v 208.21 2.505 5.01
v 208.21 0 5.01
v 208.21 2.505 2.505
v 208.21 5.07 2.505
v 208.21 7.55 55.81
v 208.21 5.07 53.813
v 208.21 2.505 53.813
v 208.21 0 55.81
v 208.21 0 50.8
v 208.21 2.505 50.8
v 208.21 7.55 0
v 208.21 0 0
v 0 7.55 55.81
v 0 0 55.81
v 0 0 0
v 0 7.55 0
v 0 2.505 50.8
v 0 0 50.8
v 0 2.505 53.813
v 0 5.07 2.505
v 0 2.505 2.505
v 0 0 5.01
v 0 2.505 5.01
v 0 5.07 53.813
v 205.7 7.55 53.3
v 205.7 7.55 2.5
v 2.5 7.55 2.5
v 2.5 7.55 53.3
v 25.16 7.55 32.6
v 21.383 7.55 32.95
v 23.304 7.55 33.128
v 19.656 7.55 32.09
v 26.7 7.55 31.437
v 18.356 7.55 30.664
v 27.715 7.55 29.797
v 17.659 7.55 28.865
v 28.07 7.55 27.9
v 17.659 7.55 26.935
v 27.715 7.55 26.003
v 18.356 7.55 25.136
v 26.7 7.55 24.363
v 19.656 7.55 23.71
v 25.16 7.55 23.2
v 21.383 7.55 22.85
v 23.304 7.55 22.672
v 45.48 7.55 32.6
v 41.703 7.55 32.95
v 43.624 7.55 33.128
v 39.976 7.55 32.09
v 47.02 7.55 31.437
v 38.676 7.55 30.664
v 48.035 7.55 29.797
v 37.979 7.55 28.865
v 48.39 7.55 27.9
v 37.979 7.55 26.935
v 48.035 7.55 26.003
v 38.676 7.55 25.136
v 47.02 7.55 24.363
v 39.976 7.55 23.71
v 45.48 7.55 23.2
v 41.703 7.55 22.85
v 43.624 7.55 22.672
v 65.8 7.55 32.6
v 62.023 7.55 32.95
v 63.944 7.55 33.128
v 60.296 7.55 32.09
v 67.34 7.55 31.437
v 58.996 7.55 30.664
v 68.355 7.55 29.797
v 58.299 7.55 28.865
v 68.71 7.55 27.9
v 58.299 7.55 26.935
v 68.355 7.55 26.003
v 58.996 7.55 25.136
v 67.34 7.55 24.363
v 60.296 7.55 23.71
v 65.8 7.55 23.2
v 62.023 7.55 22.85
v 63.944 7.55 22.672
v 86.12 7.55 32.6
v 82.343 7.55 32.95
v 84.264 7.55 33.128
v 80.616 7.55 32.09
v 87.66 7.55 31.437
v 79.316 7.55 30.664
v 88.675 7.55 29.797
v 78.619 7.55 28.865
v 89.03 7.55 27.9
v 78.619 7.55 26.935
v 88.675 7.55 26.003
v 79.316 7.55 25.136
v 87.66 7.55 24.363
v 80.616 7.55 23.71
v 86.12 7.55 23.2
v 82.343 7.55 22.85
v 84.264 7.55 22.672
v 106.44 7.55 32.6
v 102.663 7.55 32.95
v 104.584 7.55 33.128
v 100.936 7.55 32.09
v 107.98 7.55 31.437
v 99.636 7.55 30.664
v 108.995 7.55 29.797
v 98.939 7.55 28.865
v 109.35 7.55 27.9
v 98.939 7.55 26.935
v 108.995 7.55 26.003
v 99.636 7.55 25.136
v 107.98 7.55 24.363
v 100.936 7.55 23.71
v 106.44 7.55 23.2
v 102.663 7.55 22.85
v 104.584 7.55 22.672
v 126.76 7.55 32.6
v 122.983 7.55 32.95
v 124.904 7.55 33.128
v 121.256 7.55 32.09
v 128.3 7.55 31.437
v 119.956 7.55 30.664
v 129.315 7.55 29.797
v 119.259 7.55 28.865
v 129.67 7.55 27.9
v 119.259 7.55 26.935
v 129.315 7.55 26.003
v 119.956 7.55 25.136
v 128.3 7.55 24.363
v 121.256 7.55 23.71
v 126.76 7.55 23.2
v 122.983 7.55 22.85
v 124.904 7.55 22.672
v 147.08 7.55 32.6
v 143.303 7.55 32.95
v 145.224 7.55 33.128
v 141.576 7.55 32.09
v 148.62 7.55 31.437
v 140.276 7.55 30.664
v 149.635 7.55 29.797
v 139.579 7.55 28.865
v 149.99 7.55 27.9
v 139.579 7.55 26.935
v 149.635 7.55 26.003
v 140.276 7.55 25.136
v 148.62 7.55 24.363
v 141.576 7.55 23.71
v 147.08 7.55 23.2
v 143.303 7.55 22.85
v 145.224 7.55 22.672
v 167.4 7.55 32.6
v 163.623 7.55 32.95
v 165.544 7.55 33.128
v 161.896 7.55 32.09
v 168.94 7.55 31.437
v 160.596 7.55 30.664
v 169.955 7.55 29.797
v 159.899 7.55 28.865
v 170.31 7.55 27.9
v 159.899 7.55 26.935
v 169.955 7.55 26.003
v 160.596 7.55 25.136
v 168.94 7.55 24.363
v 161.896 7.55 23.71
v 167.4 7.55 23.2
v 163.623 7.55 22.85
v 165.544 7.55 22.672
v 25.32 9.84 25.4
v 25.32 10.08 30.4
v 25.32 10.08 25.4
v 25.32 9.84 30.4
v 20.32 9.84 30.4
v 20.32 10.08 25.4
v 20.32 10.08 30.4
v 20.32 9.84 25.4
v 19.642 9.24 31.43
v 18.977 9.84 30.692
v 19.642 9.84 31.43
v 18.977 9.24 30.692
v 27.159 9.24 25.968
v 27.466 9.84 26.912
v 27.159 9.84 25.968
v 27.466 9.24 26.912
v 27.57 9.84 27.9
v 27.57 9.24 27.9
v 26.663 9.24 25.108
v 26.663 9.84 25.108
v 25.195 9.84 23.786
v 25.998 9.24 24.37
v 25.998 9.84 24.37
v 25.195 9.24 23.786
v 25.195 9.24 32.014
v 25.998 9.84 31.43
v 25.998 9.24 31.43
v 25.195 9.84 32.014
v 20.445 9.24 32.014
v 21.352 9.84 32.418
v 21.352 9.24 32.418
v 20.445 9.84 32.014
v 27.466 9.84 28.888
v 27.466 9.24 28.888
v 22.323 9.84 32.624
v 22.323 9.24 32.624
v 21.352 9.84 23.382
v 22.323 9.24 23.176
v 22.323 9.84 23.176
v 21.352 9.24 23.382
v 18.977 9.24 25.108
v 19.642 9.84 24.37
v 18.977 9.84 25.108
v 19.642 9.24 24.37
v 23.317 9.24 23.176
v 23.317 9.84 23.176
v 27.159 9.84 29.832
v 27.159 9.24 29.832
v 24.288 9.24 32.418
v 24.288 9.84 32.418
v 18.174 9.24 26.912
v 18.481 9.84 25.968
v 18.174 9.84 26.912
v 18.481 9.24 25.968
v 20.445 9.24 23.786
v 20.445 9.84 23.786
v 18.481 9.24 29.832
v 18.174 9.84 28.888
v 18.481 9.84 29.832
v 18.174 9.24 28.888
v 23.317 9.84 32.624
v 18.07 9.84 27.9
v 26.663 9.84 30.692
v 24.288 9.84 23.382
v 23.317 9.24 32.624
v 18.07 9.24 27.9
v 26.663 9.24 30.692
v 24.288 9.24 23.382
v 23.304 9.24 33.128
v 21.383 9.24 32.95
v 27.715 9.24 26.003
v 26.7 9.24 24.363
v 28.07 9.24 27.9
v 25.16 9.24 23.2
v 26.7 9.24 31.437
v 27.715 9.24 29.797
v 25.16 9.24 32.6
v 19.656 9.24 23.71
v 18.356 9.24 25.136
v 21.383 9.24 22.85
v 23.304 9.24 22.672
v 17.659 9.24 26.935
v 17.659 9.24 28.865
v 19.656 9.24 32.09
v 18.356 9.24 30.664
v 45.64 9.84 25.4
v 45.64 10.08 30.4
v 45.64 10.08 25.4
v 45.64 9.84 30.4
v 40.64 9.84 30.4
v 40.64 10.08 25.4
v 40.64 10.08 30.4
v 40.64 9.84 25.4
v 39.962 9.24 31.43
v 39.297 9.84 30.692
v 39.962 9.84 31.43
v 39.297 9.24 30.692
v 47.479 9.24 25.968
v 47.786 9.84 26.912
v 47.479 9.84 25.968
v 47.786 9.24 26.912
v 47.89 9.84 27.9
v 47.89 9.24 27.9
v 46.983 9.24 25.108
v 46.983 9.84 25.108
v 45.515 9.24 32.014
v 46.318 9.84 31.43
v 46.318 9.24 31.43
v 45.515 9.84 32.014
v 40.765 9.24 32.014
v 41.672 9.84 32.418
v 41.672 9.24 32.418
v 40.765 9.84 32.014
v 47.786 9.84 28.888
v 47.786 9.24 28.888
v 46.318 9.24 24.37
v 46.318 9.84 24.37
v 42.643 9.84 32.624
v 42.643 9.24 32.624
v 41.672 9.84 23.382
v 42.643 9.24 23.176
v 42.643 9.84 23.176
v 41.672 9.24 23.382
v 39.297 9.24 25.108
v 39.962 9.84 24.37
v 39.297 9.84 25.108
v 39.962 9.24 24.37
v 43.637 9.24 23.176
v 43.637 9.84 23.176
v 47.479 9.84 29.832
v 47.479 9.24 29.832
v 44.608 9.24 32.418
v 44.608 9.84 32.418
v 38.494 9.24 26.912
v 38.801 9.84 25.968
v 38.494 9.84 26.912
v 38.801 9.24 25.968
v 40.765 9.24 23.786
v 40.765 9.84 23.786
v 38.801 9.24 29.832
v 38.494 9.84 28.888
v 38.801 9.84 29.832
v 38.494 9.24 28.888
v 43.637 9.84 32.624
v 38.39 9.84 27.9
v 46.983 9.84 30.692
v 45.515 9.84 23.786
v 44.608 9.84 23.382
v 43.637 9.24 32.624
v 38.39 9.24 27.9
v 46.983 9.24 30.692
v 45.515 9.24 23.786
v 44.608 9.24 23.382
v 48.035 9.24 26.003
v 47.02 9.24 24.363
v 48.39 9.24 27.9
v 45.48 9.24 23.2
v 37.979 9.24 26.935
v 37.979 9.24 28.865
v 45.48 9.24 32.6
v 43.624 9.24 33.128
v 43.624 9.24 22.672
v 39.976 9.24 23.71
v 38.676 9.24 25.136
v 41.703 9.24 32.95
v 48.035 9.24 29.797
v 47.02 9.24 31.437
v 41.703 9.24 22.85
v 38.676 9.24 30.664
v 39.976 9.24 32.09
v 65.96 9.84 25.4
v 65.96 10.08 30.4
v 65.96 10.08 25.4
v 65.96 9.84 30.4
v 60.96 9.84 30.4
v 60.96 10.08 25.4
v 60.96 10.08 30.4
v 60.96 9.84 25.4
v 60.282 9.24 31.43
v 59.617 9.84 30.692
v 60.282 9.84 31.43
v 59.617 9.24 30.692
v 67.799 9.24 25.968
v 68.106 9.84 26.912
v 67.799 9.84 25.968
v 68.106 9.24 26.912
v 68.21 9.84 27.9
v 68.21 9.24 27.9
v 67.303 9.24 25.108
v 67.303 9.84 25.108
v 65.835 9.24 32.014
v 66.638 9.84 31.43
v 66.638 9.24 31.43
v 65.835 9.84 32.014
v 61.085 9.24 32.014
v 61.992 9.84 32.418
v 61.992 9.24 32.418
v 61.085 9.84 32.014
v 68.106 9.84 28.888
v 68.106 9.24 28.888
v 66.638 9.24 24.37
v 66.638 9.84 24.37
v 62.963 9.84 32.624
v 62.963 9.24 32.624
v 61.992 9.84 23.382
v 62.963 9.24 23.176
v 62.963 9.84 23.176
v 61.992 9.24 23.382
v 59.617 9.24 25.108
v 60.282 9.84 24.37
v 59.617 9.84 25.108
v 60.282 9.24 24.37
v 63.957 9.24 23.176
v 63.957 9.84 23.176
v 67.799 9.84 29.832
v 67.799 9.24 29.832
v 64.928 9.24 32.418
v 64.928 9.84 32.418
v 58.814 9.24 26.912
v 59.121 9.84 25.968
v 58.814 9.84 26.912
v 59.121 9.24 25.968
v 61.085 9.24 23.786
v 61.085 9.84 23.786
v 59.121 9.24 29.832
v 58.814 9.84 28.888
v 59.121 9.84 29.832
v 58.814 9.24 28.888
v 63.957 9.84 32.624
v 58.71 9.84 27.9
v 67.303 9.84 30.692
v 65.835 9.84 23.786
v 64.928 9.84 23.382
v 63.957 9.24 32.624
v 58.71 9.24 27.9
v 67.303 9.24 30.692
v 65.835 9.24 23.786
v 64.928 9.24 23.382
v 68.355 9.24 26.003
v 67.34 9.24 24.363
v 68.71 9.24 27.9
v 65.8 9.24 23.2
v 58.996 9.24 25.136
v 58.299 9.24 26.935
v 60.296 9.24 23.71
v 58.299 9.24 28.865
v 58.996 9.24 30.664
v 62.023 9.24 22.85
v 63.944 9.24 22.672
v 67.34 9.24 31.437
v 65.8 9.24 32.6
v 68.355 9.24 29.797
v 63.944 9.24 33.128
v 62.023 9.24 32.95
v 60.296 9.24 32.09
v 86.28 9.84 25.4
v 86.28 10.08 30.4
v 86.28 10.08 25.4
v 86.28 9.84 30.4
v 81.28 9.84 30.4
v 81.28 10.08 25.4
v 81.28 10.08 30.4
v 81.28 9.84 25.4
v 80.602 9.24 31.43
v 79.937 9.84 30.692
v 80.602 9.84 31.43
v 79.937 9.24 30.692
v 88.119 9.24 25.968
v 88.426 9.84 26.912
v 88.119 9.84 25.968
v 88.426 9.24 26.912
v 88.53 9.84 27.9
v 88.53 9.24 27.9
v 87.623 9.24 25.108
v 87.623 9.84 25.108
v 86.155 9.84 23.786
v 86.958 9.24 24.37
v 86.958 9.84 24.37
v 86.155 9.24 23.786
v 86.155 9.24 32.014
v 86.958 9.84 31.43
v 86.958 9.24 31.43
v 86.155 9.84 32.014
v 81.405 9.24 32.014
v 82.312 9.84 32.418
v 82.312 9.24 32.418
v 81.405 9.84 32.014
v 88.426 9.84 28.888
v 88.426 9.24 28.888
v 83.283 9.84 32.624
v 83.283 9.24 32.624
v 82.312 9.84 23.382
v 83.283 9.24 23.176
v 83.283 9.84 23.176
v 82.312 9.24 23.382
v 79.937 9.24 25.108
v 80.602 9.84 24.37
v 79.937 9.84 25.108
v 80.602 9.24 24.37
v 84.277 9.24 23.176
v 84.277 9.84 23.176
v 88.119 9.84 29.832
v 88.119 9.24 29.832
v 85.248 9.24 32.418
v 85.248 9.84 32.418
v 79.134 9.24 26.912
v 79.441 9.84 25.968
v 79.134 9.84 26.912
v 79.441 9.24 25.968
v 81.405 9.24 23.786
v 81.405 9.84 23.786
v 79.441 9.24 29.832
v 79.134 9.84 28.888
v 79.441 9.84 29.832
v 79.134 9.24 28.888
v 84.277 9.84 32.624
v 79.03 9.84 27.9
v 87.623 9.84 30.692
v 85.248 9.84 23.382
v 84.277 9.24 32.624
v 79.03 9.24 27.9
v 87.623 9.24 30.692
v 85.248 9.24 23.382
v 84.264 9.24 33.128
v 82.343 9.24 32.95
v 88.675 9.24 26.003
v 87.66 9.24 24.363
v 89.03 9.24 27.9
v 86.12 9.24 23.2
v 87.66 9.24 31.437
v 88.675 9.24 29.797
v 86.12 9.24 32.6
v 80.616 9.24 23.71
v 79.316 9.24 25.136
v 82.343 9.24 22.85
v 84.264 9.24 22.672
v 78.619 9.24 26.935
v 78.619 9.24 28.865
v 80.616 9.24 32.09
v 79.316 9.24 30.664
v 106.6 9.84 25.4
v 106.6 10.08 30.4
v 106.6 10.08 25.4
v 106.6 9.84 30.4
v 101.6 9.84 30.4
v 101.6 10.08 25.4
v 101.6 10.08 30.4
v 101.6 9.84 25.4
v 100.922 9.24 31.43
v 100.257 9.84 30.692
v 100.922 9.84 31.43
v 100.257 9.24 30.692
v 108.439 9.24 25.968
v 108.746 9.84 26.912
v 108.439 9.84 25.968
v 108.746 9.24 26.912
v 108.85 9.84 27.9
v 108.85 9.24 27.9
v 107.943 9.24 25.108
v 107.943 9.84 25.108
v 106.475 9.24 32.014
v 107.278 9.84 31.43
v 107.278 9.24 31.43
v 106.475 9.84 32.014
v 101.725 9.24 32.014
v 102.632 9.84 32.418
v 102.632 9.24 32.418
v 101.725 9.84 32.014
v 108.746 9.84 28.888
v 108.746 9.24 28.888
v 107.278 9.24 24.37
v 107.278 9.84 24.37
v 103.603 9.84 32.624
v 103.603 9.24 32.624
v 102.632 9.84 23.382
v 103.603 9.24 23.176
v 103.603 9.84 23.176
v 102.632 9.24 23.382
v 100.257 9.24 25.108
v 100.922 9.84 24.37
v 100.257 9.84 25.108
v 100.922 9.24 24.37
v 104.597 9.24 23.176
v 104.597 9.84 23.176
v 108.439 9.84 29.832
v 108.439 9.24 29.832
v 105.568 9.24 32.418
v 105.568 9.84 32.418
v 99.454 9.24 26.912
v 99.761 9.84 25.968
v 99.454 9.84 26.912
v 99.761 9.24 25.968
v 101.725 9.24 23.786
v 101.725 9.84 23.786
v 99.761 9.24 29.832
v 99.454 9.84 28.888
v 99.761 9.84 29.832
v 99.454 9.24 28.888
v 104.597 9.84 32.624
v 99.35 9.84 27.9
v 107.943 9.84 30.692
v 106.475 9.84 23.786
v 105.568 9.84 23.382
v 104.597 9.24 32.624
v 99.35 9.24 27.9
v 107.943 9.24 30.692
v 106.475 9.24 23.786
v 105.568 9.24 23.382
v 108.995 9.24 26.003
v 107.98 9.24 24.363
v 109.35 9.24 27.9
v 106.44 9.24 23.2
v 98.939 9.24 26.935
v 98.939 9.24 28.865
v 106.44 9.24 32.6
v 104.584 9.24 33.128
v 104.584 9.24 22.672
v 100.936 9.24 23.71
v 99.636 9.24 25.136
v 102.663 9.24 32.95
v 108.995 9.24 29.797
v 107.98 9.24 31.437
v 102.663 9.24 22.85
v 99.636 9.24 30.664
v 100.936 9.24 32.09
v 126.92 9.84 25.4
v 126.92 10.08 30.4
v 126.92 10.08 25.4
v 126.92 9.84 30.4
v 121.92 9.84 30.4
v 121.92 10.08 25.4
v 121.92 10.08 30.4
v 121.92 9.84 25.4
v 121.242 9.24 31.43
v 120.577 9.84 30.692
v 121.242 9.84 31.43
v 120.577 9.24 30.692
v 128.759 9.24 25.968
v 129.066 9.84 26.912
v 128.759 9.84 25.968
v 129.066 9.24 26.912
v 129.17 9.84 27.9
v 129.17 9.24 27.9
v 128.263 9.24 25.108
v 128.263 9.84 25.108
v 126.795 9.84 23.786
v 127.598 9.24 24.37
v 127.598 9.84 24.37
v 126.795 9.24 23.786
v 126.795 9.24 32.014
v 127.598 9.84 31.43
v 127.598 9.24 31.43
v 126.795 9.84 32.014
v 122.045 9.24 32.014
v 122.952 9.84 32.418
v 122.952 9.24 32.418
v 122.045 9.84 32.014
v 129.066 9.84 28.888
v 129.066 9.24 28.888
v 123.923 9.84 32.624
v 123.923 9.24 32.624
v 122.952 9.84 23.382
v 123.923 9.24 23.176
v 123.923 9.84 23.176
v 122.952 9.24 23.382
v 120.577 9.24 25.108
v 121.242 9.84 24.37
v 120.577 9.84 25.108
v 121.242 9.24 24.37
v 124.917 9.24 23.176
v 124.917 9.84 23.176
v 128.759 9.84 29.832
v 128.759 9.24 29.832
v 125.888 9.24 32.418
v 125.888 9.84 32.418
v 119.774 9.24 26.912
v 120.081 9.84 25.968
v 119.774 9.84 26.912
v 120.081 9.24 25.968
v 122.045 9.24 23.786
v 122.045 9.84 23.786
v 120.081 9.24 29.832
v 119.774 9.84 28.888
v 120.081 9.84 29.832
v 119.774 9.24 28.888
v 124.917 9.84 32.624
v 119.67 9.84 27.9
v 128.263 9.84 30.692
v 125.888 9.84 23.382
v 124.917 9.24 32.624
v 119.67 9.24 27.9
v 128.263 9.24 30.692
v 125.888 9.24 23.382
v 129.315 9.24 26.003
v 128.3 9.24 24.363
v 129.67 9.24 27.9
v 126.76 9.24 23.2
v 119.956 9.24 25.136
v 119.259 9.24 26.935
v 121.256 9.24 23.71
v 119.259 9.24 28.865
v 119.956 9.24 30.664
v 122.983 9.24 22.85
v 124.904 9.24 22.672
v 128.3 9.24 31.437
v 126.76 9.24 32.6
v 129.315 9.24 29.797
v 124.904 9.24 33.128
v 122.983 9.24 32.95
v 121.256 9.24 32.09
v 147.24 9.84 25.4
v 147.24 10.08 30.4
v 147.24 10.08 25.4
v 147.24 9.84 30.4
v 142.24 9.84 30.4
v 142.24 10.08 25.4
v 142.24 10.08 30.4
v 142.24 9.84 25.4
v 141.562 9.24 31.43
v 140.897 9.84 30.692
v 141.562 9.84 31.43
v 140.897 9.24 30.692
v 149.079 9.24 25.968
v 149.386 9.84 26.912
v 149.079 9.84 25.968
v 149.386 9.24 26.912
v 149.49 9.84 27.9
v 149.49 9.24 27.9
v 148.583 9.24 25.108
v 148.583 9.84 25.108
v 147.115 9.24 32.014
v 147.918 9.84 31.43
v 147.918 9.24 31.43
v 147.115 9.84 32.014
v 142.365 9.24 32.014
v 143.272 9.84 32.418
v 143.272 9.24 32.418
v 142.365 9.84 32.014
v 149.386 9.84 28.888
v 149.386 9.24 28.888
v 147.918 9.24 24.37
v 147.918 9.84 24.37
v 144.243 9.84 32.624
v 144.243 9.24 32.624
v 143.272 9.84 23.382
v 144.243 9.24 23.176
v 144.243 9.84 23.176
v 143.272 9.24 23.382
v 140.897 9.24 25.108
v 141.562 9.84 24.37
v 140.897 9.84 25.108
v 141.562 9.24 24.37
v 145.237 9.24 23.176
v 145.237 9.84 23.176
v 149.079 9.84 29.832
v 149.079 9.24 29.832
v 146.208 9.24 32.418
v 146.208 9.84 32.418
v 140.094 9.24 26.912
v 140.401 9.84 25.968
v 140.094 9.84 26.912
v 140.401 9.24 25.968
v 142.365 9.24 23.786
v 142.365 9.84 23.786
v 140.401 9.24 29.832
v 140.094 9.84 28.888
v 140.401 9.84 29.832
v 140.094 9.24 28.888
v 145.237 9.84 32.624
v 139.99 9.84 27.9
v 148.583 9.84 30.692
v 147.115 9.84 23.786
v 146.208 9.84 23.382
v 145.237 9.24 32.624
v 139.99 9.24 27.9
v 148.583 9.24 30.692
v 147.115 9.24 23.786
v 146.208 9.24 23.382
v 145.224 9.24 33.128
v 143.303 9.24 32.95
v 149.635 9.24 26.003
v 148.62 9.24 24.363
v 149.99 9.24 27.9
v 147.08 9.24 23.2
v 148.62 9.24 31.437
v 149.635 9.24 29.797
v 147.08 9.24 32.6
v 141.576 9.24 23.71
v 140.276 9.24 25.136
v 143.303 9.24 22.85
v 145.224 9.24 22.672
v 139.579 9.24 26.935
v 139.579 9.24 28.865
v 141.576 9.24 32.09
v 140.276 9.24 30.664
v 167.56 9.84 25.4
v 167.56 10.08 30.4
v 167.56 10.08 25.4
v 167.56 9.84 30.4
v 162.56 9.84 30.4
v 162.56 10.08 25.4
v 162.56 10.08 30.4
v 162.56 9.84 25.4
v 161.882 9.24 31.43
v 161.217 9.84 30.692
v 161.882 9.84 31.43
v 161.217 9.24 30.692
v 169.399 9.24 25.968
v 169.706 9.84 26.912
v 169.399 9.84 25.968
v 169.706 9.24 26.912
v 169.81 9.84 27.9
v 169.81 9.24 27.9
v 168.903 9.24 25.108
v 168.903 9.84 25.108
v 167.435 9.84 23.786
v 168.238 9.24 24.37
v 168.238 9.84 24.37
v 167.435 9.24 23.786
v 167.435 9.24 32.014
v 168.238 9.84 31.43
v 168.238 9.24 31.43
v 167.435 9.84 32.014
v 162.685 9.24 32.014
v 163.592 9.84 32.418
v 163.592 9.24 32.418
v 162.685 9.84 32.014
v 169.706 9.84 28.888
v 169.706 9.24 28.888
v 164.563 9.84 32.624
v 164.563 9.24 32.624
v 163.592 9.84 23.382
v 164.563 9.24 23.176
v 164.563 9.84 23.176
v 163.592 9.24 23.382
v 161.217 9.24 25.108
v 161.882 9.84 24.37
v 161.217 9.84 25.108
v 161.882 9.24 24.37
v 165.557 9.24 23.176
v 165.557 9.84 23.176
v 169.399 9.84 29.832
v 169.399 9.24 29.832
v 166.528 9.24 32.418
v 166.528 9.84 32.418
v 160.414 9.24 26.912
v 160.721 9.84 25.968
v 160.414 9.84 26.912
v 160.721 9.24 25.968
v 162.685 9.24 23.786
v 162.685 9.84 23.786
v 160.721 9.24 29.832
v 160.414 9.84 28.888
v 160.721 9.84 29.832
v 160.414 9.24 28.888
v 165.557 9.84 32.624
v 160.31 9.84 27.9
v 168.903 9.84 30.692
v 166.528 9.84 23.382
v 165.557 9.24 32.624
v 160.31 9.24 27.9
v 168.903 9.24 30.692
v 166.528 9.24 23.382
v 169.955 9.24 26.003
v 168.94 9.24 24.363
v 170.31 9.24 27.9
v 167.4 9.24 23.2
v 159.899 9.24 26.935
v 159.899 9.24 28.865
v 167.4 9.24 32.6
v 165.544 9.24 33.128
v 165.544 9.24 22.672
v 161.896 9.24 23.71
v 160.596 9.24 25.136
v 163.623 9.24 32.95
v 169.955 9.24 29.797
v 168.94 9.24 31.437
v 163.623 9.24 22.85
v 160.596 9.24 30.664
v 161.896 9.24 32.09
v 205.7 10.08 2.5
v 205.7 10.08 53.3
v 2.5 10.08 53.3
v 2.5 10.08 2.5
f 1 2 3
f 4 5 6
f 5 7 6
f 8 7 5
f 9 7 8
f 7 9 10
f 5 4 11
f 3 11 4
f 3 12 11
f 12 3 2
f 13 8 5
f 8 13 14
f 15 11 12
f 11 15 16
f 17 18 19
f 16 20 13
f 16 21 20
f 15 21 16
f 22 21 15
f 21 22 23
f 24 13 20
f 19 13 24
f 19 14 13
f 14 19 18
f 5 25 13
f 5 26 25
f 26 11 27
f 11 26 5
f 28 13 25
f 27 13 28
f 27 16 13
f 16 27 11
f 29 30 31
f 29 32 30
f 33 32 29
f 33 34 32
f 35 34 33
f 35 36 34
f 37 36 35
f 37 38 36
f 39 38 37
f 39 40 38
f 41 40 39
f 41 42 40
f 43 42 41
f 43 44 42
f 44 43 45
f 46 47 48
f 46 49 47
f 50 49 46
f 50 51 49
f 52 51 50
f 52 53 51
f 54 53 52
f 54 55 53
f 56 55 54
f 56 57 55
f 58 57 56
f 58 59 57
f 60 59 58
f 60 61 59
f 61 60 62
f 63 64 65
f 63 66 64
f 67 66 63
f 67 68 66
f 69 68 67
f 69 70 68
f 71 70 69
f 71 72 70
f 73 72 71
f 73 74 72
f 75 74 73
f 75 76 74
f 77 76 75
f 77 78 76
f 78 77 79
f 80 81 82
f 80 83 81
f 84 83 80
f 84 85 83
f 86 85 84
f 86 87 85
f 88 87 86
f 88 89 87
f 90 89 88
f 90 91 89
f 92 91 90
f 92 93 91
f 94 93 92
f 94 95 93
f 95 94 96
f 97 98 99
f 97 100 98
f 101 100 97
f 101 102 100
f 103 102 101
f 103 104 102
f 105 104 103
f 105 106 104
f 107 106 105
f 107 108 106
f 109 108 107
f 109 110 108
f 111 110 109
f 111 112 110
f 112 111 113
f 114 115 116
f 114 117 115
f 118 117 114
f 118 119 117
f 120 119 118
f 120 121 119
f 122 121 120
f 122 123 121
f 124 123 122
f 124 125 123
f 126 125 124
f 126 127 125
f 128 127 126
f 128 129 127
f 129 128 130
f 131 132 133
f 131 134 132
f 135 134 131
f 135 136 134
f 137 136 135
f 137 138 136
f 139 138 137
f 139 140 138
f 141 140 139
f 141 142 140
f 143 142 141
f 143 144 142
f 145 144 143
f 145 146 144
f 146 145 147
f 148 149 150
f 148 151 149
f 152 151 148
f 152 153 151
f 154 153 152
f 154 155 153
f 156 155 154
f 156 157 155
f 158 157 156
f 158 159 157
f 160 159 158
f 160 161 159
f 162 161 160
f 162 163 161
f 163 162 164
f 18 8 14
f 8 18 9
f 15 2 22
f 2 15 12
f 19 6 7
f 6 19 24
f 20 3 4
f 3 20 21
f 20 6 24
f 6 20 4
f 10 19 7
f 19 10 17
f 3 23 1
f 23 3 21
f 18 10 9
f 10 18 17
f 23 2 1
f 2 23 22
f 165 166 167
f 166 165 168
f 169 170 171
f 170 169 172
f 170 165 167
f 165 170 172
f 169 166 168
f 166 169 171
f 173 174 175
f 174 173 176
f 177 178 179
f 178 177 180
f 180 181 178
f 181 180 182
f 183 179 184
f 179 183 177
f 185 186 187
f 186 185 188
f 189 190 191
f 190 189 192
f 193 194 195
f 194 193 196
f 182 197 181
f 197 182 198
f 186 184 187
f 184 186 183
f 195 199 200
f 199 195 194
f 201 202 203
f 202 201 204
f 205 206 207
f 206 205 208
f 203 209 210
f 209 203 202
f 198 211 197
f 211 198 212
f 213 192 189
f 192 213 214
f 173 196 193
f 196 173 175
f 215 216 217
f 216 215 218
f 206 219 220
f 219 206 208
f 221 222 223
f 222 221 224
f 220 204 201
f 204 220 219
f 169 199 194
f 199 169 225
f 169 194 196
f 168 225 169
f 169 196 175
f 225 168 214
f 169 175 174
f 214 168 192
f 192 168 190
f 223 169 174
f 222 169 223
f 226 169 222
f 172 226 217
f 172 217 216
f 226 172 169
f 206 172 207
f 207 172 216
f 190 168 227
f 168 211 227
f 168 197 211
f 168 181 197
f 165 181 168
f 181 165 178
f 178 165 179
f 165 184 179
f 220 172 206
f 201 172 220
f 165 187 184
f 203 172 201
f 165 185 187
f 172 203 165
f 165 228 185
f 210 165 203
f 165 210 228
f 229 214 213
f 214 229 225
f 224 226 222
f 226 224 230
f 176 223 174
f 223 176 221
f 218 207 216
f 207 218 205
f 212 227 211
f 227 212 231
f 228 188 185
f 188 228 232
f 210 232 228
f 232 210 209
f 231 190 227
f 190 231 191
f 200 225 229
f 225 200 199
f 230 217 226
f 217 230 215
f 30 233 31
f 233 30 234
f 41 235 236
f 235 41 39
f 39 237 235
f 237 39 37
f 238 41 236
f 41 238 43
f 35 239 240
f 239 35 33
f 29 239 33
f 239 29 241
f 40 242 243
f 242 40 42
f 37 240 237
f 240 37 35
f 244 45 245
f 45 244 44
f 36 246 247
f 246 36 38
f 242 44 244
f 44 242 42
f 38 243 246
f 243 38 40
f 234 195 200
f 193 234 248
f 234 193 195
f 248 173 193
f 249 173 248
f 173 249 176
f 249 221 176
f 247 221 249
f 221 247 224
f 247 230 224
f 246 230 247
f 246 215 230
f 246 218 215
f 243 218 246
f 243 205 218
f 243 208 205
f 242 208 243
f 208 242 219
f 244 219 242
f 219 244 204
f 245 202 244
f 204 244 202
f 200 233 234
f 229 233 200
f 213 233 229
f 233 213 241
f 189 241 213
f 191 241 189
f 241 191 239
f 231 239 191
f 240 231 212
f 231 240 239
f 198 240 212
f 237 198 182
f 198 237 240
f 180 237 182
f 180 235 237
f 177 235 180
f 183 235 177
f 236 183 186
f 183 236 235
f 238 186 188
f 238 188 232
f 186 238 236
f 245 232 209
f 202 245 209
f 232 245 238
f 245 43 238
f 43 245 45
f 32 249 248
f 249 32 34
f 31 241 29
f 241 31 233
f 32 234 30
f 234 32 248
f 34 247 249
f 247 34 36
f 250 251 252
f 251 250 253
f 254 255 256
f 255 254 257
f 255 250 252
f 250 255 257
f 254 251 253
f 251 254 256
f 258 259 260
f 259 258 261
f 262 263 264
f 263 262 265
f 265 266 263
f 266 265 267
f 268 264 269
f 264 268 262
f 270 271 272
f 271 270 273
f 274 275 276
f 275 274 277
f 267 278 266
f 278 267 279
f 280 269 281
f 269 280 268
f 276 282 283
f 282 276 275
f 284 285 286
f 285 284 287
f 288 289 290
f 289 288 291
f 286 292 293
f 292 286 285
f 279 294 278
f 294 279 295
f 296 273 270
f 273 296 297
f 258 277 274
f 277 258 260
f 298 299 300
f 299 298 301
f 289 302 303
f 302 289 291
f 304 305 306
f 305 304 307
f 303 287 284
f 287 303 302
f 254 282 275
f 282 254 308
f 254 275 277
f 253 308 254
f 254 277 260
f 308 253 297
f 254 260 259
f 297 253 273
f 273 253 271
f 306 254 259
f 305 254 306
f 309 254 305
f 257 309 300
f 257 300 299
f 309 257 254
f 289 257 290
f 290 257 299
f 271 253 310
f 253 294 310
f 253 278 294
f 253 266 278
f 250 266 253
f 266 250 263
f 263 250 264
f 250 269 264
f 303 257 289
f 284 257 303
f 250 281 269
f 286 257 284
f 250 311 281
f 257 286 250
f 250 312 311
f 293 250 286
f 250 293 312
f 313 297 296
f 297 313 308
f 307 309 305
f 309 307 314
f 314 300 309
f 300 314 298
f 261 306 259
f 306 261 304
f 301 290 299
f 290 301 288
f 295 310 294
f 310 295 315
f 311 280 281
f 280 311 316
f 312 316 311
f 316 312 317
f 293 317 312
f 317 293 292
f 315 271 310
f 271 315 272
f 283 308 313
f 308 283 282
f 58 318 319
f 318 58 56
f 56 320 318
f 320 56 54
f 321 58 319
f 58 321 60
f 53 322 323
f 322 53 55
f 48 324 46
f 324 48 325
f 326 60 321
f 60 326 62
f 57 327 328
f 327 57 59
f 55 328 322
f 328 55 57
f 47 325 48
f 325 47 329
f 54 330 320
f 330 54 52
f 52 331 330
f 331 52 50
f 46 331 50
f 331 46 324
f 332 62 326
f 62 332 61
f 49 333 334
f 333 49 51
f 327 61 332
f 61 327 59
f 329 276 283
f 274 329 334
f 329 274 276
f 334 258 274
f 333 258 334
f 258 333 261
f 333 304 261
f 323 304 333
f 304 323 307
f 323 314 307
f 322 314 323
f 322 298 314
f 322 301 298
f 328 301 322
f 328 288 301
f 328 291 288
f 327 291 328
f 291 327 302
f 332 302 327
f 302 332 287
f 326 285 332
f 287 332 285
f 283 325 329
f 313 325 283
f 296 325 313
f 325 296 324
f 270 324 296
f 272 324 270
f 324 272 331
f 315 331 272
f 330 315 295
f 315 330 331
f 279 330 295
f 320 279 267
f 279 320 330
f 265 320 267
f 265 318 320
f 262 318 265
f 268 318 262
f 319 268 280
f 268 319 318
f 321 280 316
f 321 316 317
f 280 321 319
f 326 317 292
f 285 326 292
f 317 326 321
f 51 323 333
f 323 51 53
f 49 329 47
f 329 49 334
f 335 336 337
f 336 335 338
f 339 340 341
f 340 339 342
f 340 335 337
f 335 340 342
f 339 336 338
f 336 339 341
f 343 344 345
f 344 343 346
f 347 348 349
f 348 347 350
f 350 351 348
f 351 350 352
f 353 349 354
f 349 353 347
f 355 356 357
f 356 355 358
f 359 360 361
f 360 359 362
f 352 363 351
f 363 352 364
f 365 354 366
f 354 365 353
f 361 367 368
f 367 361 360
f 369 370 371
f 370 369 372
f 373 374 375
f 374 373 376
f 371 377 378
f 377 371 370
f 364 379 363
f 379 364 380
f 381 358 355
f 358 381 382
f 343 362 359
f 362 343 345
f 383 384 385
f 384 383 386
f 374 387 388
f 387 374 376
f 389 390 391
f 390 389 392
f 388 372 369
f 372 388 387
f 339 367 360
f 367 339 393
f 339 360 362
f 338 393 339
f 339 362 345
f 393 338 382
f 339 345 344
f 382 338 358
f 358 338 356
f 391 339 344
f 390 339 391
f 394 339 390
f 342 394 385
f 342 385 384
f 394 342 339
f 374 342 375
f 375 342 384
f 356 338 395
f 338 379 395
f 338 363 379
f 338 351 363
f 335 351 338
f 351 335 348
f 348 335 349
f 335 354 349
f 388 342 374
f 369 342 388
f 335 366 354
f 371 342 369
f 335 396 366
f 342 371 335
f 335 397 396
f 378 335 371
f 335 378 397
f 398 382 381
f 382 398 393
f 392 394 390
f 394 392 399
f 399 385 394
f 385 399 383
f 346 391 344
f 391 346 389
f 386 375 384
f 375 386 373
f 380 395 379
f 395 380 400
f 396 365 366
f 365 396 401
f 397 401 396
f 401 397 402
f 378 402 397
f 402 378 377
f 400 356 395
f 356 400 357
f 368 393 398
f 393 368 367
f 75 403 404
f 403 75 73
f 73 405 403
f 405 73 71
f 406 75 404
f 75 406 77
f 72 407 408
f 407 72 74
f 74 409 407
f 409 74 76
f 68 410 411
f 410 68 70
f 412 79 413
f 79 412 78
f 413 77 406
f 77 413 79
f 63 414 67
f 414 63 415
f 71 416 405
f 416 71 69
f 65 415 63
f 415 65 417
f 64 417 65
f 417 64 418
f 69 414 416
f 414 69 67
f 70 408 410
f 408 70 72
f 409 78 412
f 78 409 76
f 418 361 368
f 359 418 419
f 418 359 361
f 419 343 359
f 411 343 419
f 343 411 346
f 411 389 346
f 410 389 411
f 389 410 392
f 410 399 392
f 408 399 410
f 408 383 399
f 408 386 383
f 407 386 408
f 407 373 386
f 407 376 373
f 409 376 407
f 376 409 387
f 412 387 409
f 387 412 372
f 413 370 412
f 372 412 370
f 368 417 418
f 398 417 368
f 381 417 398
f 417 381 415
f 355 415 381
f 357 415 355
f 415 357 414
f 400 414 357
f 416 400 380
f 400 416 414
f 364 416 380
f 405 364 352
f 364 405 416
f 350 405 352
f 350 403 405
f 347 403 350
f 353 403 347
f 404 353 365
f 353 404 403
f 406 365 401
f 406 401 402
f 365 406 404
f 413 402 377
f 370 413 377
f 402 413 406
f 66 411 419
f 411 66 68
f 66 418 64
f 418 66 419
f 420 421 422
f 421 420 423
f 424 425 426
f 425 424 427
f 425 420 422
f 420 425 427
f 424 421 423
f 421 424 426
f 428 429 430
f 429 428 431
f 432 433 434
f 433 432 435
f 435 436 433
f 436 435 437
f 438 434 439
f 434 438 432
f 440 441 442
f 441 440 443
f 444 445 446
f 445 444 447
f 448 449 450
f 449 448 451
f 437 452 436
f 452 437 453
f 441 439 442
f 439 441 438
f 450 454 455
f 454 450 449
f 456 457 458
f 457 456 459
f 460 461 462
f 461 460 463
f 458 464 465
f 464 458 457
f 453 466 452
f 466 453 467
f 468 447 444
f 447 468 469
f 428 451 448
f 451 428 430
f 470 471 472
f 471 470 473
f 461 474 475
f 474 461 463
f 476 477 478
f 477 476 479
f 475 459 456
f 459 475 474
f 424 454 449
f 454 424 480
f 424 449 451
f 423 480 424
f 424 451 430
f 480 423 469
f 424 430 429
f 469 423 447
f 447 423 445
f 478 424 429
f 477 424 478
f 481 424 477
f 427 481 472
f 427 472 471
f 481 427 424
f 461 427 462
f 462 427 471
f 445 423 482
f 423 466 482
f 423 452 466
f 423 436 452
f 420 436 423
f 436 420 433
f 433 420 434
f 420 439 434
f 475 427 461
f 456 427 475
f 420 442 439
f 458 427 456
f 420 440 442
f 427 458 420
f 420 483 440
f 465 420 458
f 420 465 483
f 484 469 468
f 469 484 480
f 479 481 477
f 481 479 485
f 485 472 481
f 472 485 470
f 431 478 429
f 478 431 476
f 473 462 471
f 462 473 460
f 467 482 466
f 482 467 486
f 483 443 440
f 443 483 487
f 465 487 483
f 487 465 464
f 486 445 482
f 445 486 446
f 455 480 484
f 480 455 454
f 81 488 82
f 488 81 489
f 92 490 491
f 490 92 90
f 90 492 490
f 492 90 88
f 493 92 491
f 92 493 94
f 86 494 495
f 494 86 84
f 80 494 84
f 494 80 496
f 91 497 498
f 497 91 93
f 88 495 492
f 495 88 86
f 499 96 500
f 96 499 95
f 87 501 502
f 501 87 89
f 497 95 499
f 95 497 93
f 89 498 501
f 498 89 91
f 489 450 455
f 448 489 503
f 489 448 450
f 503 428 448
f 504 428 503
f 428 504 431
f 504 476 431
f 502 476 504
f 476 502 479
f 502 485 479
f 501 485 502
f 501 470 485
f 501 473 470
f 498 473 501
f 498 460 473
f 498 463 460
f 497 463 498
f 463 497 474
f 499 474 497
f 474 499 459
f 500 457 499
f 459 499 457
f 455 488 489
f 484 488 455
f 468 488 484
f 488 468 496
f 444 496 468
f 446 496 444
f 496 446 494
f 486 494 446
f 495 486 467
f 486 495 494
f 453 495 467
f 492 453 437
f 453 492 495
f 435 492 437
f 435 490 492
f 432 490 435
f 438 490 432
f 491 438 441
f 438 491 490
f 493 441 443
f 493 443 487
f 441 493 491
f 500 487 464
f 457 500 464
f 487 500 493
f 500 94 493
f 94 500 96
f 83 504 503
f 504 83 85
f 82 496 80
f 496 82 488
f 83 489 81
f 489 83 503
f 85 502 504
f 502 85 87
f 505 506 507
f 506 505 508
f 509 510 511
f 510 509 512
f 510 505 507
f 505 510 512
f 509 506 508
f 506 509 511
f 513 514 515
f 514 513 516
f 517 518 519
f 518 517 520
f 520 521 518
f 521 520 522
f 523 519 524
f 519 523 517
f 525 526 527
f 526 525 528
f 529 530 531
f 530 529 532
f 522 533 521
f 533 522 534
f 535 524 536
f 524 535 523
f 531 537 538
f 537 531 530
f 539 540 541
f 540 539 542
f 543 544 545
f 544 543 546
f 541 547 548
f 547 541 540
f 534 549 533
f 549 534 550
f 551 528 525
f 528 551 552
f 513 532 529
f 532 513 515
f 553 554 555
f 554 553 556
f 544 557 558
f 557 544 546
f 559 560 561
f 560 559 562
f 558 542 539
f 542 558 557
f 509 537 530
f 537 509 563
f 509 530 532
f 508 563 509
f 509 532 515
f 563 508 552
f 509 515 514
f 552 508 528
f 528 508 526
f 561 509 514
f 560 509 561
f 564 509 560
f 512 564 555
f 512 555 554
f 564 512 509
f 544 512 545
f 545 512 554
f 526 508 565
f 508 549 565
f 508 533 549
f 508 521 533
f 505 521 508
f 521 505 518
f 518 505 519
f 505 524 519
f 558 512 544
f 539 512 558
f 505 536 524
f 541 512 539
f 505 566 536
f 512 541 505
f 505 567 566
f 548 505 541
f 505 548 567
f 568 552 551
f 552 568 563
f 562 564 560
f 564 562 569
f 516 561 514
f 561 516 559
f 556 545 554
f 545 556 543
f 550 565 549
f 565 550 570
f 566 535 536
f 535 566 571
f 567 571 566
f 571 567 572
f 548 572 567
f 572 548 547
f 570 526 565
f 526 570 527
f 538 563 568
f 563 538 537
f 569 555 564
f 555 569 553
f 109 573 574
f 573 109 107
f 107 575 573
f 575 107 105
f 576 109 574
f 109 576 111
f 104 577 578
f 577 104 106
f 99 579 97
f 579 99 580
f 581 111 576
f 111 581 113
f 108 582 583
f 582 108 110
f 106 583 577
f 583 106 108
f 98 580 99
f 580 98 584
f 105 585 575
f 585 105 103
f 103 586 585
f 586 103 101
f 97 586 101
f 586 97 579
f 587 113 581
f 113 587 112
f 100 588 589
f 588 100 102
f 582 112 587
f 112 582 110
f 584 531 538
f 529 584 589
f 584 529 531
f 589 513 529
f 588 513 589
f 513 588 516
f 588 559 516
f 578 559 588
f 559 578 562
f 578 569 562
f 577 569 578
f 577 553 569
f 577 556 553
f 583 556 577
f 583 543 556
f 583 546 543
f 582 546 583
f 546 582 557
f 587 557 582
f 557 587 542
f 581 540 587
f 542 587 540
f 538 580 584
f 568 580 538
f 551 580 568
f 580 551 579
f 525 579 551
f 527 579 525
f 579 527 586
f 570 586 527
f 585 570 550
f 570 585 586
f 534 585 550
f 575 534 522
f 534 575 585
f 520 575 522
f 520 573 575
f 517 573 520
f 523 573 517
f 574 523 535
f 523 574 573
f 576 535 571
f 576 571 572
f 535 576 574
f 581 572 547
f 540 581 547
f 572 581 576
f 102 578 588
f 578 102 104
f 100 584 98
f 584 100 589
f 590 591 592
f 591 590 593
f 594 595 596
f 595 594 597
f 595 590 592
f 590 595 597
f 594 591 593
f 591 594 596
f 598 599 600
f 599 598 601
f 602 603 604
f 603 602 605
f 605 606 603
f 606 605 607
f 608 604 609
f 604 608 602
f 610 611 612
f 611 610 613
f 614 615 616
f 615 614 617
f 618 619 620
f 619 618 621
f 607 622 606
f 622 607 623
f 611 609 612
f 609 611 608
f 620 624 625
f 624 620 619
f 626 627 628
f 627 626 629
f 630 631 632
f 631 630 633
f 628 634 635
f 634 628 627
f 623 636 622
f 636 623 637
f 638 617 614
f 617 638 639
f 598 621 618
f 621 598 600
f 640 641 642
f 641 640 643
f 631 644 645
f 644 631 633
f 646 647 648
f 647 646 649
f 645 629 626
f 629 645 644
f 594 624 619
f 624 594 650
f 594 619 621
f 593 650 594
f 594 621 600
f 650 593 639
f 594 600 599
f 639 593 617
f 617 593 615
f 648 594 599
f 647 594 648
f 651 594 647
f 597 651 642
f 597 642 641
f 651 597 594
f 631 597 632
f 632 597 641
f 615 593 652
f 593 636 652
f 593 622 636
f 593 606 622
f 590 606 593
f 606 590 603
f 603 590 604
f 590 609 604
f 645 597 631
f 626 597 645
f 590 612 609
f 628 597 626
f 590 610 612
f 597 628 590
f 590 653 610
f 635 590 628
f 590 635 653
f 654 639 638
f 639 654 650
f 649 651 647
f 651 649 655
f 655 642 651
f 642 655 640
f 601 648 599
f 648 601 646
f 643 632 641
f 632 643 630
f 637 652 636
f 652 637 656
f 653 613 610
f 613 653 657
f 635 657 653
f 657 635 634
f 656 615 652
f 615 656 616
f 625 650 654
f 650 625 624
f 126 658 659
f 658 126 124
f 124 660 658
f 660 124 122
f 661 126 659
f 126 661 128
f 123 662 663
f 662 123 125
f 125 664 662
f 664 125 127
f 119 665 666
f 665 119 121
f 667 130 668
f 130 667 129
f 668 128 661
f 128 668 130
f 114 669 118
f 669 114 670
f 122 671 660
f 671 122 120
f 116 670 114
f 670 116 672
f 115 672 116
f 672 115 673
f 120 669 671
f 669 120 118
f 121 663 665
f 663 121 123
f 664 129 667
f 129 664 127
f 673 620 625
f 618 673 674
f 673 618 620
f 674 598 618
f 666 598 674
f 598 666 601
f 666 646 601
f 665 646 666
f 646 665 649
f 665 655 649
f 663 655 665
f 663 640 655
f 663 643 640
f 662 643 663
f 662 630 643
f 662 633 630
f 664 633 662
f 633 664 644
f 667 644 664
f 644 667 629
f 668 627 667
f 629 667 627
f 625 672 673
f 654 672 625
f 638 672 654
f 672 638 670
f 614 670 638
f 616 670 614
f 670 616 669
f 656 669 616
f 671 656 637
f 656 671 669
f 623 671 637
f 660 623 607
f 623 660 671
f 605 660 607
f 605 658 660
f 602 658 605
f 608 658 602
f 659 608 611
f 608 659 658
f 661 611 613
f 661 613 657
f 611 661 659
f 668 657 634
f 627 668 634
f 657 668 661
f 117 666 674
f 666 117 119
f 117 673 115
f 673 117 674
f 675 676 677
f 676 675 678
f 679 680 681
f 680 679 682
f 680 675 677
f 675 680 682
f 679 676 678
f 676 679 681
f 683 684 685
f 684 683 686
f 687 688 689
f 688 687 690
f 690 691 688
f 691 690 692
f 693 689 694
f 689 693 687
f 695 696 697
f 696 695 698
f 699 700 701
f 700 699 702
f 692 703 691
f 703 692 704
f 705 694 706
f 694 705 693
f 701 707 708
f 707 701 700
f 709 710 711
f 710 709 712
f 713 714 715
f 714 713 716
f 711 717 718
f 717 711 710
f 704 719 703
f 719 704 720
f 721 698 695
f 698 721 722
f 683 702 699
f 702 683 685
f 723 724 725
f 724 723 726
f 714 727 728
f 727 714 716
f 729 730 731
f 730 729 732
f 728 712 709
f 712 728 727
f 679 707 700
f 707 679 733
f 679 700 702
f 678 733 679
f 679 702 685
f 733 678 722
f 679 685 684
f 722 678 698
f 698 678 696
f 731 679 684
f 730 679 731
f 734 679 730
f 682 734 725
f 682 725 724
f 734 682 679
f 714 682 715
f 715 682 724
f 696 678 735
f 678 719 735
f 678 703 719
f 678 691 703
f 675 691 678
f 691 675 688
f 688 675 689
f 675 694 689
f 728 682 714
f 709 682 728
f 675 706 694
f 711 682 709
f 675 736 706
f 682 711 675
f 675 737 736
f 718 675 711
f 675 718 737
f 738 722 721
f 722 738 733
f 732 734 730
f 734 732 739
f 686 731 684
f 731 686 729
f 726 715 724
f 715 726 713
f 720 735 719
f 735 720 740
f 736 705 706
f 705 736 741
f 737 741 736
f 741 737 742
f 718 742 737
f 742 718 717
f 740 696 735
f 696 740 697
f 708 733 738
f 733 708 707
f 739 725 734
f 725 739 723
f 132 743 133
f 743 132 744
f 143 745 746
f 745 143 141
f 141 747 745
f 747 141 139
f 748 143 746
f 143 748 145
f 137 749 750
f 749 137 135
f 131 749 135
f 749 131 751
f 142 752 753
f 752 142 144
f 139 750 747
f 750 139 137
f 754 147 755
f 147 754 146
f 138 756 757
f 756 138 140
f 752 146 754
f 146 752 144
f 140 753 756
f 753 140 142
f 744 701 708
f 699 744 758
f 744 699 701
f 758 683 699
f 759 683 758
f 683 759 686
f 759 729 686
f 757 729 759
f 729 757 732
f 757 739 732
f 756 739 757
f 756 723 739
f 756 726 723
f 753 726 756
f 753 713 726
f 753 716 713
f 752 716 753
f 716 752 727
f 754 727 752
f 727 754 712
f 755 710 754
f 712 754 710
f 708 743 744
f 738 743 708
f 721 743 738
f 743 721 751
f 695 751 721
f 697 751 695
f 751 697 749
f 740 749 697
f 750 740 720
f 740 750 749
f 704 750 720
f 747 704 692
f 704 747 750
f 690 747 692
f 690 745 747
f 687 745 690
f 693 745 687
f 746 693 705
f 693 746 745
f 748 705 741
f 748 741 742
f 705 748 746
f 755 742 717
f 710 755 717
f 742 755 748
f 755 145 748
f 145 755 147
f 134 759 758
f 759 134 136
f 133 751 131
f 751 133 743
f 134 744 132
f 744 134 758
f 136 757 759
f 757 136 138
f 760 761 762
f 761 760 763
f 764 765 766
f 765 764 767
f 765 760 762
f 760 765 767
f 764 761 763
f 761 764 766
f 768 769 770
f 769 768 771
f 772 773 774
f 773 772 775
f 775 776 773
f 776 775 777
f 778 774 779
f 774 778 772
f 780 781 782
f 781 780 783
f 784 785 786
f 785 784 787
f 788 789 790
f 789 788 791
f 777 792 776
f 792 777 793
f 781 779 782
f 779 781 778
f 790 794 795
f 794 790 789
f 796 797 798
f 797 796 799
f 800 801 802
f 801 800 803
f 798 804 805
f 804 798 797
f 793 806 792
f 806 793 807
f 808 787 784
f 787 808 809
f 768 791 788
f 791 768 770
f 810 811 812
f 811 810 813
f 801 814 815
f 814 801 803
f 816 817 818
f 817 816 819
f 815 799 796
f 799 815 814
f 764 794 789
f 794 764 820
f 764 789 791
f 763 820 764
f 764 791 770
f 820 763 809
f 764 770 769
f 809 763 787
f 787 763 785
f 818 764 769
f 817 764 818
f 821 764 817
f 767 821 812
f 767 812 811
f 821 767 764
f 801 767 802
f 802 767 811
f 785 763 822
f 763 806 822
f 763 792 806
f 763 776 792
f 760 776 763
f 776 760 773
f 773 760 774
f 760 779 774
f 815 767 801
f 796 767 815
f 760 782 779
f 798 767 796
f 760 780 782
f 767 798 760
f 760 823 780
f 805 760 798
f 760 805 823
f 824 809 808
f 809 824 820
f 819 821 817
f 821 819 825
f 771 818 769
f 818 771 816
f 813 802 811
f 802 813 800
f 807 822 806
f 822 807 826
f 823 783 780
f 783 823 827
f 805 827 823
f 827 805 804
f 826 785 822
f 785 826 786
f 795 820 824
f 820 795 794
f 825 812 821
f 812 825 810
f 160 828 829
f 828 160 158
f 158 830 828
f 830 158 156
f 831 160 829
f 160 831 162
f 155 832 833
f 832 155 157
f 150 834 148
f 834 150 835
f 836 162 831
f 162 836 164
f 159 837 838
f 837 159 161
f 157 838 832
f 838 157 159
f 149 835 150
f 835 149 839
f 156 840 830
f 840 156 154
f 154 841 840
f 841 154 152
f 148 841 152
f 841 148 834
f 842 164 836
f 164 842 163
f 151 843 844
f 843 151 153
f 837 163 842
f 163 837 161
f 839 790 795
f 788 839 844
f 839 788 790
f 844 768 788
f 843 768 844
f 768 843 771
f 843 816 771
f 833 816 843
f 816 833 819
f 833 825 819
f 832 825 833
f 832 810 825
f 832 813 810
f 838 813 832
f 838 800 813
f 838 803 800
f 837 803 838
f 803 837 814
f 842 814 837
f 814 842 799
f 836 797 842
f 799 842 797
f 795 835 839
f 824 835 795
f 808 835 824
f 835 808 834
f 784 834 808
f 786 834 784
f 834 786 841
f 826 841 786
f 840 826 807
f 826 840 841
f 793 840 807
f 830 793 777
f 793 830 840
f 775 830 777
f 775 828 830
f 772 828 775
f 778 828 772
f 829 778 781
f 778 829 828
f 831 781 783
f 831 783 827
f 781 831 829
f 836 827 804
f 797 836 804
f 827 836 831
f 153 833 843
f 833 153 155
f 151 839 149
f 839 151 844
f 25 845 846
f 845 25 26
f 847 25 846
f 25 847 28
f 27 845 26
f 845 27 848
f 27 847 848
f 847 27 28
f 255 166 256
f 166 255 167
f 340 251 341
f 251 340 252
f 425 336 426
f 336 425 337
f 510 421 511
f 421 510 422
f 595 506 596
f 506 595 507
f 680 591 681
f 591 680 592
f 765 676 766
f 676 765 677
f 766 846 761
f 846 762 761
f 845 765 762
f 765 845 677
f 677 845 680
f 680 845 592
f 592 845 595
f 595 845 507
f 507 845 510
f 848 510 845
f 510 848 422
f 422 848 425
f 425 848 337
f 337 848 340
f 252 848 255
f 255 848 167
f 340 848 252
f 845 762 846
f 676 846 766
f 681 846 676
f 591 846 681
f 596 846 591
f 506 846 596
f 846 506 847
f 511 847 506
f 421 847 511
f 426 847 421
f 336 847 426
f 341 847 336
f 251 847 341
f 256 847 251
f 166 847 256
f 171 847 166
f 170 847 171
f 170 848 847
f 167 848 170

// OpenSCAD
// file: ../lib/neo_pixel.scad
///< Alitovo Neo pixel RGB X000UCVKBH 2812b-1-LED-WH
use <../lib/math.scad>;
use <../lib/utils.scad>;

///< Parameters - Begin
led_assembly_h = 2.8;
led_assembly_d = 9.5;

///< Diameter of the PCB 
pcb_d = 9.5;
pcb_h = 1.2;

///< Demensions of the LED IC
led_w = 5;
led_d = led_w;
led_h = led_assembly_h - pcb_h;


///< Modules
module pcb(){
     ///< LED PCB definition
     color( rand_clr() )cylinder( h=pcb_h, d=pcb_d, $fn = 30 );
}

module led(){
     ///< Neo pixel LED (2812b-1)
     union(){
         color( rand_clr() )cube( [ led_w, led_d, led_h ] );
         color( rand_clr() )
              translate([led_w/2,led_d/2, 0] )
              cylinder( h=led_h, d= led_w, $fn = 30 );
         }
}

module neo_pixel(){
     ///< Assembly of the led and pcb_pad
     union(){
          translate([-led_w/2,-led_d/2,pcb_h-0.01])led();
          pcb();
          }

}

///< Build object
///< Remove this when including
//neo_pixel();
// file: nameplate.scad
///< Nameplate
/*
https://en.wikipedia.org/wiki/Nameplate
Excerpt:  'Although office nameplates range in size, the most popular nameplate size is 2 by 8 inches (5.08 cm × 20.32 cm)'

*/
use <../lib/math.scad>;
use <../lib/utils.scad>;

///< Parameters
nameplate_w_inches = 8;
nameplate_h_inches = 2;
nameplate_d_inches = 0.10;

nameplate_w = in2mm( nameplate_w_inches );
nameplate_h = in2mm( nameplate_h_inches );
nameplate_d = in2mm( nameplate_d_inches );

nameplate_debug = false;

if( nameplate_debug ) {
     echo( "Nameplate width: ",  nameplate_w,  "mm" );
     echo( "Nameplate height: ", nameplate_h, "mm" );
     echo( "Nameplate depth: ",  nameplate_d,  "mm" );
}

nameplate = [ nameplate_w, nameplate_d, nameplate_h ];

///< Modules
module Nameplate( size, center = false ) {
     cube( size, center = center );
}
// file: led_frame.scad
///< LED frame for the neo pixel array
use <../lib/math.scad>;
use <../lib/utils.scad>;
include <../lib/neo_pixel.scad>

///< Parameters
frame_w      = 150;
pcb_socket_d = led_assembly_d + 1;
pcb_socket_h = 1.0;
frame_d      = led_assembly_h+pcb_socket_h;//-led_assembly_h*0.04;
frame_h      = pcb_socket_d+1.5;
num_leds     = 10;

///< Modules
module led_frame( width, depth, height ){
     //union(){
     difference(){
          cube( [width, depth, height] );
          led_spacing_w = width/( num_leds );

          ///< Make x number of slots
          for (i = [0:num_leds]){
               offset_spacing = (( i * led_spacing_w ) + ( led_spacing_w ));
               remaining = width - offset_spacing;
               if( remaining >= led_spacing_w ){
                    translate( [ offset_spacing, (pcb_socket_h+0.1), height/2 ] )
                         rotate( [ -90, 0, 0 ])
                         color( rand_clr() )
                         neo_pixel(h=pcb_h+0.1, d=pcb_socket_d);
                    translate( [ offset_spacing, -0.5, height/2 ] )
                        rotate( [ -90, 0, 0 ])
                        color( rand_clr() )
                        cylinder( h=pcb_h+pcb_socket_h, d = pcb_socket_d );

               }
          }
     }
}

///< Build object
echo( "Frame height:", frame_h, "depth:", frame_d, "width:", frame_w );
led_frame( frame_w, frame_d, frame_h );
// file: ../lib/utils.scad
///< Utilities

function rand_clr() = rands( 0,1,3 );

///< Length conversions
function in2mm( i ) = ( i * 25.4 ); 
function mm2in( m ) = ( m / 25.4 );

/// This is pulled from stackoverflow
/// https://stackoverflow.com/questions/45826208/openscad-rotating-around-a-particular-point

// rotate as per a, v, but around point pt
module rotate_about_pt(a, v, pt) {
    translate(pt)
        rotate(a,v)
            translate(-pt)
                children();   
}

function adjust_z_offset( v, z ) = [for (i=[0:(len(v)-1)]) v[i]+[0,0,z]] ;

///< For each child, translate child by <p> point in points
module foreach_translate(points ){
	for (p=points){
		translate(p) children();
	}
}
// file: ../lib/math.scad
///< Math scad module


///< Find the hypotenuse from two sides of a right triangle
function hyp_from_sides( a, b ) = sqrt( pow( a, 2 ) + pow( b, 2 ) );

///< Find equal sides from hypotenuse of a right triangle
function sides_from_hyp(h) = sqrt( pow( h, 2 ) / 2 );

///< Find A from hypotenuse and B
function a_from_hb( h, b ) = sqrt( pow( h, 2 ) - pow( b, 2 ) );

function dist_2d( pt2, pt1 ) = sqrt(pow(( pt2[0]-pt1[0] ),2) + pow(( pt2[1]-pt1[1]),2) );

function mid_pt_2d( pt2, pt1 ) = [( pt1[0]+pt2[0] )/2, ( pt1[1]+pt2[1] )/2, 0 ];

function opposite_side_th( theta, hypotenuse ) = sin( theta )*hypotenuse ;
function adjacent_side_th( theta, hypotenuse ) = cos( theta )*hypotenuse ;

///< Test for math functions

A = 3;
B = 4;
echo("Given A=", A, "and B=", B );
H = hyp_from_sides( A, B );
echo("Hypotenuse=", H );
echo("Calc Correct = ", (H == 5) );

echo("Given H=", H, " which is a hypotenuse with equal sides" );
echo( "the sides=", sides_from_hyp( H ) );

echo("Given H=", H, "B=", 4 );
echo("A=", a_from_hb( H, 4 ) );

echo("Distance from [-1,1] and [3,4] = ", dist_2d( [-1,1],[3,4]) );

echo( "Opposite = ", opposite_side_th( 39.0, 30 ), "Theta = ", 39.0, "Hypotenuse = ", 30 );
echo( "Adjacent = ", adjacent_side_th( 60.0, 10 ), "Theta = ", 60.0, "Hypotenuse = ", 10 );

///< Find the sum of a vector <vect> starting from <s> and continuing to <i>
function sumv( vect, i, s=0 ) = ( i == s ? vect[ i ] : vect[ i ] + sumv( vect, i - 1, s ) );
vec = [ 1, 2, 3, 4 ];
l = len( vec )-1;
echo( "Sum vec = ", sumv( vec, l, 0 ) );

///< Find the average of a vector <vect> starting at <s>
function average( vect, s=0 ) = (len( vect ) == 0 ? 0 : ( sumv( vect, len( vect ) - 1, s )/len(vect) ) );
echo( "Ave vec = ", average( vec ) );
vec2 = [];
echo( "Ave vec2 = ", average( vec2 ) );
// main file
///< Object definition
use <../lib/math.scad>;
use <../lib/utils.scad>;
use <led_frame.scad>;
include <nameplate.scad>

///< Parameters
module frame( w, d, h, pad = 5, show_nameplate = false ){

     ///< Frame demensions
     frame_clearance = 0.01;
     frame_p = pad + frame_clearance; //< Padding
     frame_w = w + frame_p;
     frame_d = d + frame_p;
     frame_h = h + frame_p;

     frame = [ frame_w, frame_d, frame_h ];
     frame_inset = [0, frame_p/2, frame_p/2 ];
     frame_view  = [0, 0,         frame_p ];

     nameplate_cut = [ ( frame_w + ( frame_p * 2.0 ) ) * 1.01,
		     d * 1.01,
		     h * 1.01 ];

     view_w = frame_w;
     view_d = d;
     view_h = h - ( frame_p);
     view_cut = [ view_w, view_d, view_h ];

     if( show_nameplate ){
	  echo( nameplate );
	  color( rand_clr() )
	       translate( frame_inset ){ Nameplate( nameplate ); }
     }

     ///< Holder
     difference(){
	  color( rand_clr() )cube( frame );
	  color( rand_clr() )
	       translate( frame_inset )
	       Nameplate( nameplate_cut );
	  color( rand_clr() )
	       translate( frame_view )
	       cube( view_cut );
     }
     translate( [ pad/2, ( d + pad ), pad/2 ] )
	  led_frame( w, d, h );
}

///< Build object
echo( nameplate_w, nameplate_d, nameplate_h  );
frame( nameplate_w, nameplate_d, nameplate_h  );
